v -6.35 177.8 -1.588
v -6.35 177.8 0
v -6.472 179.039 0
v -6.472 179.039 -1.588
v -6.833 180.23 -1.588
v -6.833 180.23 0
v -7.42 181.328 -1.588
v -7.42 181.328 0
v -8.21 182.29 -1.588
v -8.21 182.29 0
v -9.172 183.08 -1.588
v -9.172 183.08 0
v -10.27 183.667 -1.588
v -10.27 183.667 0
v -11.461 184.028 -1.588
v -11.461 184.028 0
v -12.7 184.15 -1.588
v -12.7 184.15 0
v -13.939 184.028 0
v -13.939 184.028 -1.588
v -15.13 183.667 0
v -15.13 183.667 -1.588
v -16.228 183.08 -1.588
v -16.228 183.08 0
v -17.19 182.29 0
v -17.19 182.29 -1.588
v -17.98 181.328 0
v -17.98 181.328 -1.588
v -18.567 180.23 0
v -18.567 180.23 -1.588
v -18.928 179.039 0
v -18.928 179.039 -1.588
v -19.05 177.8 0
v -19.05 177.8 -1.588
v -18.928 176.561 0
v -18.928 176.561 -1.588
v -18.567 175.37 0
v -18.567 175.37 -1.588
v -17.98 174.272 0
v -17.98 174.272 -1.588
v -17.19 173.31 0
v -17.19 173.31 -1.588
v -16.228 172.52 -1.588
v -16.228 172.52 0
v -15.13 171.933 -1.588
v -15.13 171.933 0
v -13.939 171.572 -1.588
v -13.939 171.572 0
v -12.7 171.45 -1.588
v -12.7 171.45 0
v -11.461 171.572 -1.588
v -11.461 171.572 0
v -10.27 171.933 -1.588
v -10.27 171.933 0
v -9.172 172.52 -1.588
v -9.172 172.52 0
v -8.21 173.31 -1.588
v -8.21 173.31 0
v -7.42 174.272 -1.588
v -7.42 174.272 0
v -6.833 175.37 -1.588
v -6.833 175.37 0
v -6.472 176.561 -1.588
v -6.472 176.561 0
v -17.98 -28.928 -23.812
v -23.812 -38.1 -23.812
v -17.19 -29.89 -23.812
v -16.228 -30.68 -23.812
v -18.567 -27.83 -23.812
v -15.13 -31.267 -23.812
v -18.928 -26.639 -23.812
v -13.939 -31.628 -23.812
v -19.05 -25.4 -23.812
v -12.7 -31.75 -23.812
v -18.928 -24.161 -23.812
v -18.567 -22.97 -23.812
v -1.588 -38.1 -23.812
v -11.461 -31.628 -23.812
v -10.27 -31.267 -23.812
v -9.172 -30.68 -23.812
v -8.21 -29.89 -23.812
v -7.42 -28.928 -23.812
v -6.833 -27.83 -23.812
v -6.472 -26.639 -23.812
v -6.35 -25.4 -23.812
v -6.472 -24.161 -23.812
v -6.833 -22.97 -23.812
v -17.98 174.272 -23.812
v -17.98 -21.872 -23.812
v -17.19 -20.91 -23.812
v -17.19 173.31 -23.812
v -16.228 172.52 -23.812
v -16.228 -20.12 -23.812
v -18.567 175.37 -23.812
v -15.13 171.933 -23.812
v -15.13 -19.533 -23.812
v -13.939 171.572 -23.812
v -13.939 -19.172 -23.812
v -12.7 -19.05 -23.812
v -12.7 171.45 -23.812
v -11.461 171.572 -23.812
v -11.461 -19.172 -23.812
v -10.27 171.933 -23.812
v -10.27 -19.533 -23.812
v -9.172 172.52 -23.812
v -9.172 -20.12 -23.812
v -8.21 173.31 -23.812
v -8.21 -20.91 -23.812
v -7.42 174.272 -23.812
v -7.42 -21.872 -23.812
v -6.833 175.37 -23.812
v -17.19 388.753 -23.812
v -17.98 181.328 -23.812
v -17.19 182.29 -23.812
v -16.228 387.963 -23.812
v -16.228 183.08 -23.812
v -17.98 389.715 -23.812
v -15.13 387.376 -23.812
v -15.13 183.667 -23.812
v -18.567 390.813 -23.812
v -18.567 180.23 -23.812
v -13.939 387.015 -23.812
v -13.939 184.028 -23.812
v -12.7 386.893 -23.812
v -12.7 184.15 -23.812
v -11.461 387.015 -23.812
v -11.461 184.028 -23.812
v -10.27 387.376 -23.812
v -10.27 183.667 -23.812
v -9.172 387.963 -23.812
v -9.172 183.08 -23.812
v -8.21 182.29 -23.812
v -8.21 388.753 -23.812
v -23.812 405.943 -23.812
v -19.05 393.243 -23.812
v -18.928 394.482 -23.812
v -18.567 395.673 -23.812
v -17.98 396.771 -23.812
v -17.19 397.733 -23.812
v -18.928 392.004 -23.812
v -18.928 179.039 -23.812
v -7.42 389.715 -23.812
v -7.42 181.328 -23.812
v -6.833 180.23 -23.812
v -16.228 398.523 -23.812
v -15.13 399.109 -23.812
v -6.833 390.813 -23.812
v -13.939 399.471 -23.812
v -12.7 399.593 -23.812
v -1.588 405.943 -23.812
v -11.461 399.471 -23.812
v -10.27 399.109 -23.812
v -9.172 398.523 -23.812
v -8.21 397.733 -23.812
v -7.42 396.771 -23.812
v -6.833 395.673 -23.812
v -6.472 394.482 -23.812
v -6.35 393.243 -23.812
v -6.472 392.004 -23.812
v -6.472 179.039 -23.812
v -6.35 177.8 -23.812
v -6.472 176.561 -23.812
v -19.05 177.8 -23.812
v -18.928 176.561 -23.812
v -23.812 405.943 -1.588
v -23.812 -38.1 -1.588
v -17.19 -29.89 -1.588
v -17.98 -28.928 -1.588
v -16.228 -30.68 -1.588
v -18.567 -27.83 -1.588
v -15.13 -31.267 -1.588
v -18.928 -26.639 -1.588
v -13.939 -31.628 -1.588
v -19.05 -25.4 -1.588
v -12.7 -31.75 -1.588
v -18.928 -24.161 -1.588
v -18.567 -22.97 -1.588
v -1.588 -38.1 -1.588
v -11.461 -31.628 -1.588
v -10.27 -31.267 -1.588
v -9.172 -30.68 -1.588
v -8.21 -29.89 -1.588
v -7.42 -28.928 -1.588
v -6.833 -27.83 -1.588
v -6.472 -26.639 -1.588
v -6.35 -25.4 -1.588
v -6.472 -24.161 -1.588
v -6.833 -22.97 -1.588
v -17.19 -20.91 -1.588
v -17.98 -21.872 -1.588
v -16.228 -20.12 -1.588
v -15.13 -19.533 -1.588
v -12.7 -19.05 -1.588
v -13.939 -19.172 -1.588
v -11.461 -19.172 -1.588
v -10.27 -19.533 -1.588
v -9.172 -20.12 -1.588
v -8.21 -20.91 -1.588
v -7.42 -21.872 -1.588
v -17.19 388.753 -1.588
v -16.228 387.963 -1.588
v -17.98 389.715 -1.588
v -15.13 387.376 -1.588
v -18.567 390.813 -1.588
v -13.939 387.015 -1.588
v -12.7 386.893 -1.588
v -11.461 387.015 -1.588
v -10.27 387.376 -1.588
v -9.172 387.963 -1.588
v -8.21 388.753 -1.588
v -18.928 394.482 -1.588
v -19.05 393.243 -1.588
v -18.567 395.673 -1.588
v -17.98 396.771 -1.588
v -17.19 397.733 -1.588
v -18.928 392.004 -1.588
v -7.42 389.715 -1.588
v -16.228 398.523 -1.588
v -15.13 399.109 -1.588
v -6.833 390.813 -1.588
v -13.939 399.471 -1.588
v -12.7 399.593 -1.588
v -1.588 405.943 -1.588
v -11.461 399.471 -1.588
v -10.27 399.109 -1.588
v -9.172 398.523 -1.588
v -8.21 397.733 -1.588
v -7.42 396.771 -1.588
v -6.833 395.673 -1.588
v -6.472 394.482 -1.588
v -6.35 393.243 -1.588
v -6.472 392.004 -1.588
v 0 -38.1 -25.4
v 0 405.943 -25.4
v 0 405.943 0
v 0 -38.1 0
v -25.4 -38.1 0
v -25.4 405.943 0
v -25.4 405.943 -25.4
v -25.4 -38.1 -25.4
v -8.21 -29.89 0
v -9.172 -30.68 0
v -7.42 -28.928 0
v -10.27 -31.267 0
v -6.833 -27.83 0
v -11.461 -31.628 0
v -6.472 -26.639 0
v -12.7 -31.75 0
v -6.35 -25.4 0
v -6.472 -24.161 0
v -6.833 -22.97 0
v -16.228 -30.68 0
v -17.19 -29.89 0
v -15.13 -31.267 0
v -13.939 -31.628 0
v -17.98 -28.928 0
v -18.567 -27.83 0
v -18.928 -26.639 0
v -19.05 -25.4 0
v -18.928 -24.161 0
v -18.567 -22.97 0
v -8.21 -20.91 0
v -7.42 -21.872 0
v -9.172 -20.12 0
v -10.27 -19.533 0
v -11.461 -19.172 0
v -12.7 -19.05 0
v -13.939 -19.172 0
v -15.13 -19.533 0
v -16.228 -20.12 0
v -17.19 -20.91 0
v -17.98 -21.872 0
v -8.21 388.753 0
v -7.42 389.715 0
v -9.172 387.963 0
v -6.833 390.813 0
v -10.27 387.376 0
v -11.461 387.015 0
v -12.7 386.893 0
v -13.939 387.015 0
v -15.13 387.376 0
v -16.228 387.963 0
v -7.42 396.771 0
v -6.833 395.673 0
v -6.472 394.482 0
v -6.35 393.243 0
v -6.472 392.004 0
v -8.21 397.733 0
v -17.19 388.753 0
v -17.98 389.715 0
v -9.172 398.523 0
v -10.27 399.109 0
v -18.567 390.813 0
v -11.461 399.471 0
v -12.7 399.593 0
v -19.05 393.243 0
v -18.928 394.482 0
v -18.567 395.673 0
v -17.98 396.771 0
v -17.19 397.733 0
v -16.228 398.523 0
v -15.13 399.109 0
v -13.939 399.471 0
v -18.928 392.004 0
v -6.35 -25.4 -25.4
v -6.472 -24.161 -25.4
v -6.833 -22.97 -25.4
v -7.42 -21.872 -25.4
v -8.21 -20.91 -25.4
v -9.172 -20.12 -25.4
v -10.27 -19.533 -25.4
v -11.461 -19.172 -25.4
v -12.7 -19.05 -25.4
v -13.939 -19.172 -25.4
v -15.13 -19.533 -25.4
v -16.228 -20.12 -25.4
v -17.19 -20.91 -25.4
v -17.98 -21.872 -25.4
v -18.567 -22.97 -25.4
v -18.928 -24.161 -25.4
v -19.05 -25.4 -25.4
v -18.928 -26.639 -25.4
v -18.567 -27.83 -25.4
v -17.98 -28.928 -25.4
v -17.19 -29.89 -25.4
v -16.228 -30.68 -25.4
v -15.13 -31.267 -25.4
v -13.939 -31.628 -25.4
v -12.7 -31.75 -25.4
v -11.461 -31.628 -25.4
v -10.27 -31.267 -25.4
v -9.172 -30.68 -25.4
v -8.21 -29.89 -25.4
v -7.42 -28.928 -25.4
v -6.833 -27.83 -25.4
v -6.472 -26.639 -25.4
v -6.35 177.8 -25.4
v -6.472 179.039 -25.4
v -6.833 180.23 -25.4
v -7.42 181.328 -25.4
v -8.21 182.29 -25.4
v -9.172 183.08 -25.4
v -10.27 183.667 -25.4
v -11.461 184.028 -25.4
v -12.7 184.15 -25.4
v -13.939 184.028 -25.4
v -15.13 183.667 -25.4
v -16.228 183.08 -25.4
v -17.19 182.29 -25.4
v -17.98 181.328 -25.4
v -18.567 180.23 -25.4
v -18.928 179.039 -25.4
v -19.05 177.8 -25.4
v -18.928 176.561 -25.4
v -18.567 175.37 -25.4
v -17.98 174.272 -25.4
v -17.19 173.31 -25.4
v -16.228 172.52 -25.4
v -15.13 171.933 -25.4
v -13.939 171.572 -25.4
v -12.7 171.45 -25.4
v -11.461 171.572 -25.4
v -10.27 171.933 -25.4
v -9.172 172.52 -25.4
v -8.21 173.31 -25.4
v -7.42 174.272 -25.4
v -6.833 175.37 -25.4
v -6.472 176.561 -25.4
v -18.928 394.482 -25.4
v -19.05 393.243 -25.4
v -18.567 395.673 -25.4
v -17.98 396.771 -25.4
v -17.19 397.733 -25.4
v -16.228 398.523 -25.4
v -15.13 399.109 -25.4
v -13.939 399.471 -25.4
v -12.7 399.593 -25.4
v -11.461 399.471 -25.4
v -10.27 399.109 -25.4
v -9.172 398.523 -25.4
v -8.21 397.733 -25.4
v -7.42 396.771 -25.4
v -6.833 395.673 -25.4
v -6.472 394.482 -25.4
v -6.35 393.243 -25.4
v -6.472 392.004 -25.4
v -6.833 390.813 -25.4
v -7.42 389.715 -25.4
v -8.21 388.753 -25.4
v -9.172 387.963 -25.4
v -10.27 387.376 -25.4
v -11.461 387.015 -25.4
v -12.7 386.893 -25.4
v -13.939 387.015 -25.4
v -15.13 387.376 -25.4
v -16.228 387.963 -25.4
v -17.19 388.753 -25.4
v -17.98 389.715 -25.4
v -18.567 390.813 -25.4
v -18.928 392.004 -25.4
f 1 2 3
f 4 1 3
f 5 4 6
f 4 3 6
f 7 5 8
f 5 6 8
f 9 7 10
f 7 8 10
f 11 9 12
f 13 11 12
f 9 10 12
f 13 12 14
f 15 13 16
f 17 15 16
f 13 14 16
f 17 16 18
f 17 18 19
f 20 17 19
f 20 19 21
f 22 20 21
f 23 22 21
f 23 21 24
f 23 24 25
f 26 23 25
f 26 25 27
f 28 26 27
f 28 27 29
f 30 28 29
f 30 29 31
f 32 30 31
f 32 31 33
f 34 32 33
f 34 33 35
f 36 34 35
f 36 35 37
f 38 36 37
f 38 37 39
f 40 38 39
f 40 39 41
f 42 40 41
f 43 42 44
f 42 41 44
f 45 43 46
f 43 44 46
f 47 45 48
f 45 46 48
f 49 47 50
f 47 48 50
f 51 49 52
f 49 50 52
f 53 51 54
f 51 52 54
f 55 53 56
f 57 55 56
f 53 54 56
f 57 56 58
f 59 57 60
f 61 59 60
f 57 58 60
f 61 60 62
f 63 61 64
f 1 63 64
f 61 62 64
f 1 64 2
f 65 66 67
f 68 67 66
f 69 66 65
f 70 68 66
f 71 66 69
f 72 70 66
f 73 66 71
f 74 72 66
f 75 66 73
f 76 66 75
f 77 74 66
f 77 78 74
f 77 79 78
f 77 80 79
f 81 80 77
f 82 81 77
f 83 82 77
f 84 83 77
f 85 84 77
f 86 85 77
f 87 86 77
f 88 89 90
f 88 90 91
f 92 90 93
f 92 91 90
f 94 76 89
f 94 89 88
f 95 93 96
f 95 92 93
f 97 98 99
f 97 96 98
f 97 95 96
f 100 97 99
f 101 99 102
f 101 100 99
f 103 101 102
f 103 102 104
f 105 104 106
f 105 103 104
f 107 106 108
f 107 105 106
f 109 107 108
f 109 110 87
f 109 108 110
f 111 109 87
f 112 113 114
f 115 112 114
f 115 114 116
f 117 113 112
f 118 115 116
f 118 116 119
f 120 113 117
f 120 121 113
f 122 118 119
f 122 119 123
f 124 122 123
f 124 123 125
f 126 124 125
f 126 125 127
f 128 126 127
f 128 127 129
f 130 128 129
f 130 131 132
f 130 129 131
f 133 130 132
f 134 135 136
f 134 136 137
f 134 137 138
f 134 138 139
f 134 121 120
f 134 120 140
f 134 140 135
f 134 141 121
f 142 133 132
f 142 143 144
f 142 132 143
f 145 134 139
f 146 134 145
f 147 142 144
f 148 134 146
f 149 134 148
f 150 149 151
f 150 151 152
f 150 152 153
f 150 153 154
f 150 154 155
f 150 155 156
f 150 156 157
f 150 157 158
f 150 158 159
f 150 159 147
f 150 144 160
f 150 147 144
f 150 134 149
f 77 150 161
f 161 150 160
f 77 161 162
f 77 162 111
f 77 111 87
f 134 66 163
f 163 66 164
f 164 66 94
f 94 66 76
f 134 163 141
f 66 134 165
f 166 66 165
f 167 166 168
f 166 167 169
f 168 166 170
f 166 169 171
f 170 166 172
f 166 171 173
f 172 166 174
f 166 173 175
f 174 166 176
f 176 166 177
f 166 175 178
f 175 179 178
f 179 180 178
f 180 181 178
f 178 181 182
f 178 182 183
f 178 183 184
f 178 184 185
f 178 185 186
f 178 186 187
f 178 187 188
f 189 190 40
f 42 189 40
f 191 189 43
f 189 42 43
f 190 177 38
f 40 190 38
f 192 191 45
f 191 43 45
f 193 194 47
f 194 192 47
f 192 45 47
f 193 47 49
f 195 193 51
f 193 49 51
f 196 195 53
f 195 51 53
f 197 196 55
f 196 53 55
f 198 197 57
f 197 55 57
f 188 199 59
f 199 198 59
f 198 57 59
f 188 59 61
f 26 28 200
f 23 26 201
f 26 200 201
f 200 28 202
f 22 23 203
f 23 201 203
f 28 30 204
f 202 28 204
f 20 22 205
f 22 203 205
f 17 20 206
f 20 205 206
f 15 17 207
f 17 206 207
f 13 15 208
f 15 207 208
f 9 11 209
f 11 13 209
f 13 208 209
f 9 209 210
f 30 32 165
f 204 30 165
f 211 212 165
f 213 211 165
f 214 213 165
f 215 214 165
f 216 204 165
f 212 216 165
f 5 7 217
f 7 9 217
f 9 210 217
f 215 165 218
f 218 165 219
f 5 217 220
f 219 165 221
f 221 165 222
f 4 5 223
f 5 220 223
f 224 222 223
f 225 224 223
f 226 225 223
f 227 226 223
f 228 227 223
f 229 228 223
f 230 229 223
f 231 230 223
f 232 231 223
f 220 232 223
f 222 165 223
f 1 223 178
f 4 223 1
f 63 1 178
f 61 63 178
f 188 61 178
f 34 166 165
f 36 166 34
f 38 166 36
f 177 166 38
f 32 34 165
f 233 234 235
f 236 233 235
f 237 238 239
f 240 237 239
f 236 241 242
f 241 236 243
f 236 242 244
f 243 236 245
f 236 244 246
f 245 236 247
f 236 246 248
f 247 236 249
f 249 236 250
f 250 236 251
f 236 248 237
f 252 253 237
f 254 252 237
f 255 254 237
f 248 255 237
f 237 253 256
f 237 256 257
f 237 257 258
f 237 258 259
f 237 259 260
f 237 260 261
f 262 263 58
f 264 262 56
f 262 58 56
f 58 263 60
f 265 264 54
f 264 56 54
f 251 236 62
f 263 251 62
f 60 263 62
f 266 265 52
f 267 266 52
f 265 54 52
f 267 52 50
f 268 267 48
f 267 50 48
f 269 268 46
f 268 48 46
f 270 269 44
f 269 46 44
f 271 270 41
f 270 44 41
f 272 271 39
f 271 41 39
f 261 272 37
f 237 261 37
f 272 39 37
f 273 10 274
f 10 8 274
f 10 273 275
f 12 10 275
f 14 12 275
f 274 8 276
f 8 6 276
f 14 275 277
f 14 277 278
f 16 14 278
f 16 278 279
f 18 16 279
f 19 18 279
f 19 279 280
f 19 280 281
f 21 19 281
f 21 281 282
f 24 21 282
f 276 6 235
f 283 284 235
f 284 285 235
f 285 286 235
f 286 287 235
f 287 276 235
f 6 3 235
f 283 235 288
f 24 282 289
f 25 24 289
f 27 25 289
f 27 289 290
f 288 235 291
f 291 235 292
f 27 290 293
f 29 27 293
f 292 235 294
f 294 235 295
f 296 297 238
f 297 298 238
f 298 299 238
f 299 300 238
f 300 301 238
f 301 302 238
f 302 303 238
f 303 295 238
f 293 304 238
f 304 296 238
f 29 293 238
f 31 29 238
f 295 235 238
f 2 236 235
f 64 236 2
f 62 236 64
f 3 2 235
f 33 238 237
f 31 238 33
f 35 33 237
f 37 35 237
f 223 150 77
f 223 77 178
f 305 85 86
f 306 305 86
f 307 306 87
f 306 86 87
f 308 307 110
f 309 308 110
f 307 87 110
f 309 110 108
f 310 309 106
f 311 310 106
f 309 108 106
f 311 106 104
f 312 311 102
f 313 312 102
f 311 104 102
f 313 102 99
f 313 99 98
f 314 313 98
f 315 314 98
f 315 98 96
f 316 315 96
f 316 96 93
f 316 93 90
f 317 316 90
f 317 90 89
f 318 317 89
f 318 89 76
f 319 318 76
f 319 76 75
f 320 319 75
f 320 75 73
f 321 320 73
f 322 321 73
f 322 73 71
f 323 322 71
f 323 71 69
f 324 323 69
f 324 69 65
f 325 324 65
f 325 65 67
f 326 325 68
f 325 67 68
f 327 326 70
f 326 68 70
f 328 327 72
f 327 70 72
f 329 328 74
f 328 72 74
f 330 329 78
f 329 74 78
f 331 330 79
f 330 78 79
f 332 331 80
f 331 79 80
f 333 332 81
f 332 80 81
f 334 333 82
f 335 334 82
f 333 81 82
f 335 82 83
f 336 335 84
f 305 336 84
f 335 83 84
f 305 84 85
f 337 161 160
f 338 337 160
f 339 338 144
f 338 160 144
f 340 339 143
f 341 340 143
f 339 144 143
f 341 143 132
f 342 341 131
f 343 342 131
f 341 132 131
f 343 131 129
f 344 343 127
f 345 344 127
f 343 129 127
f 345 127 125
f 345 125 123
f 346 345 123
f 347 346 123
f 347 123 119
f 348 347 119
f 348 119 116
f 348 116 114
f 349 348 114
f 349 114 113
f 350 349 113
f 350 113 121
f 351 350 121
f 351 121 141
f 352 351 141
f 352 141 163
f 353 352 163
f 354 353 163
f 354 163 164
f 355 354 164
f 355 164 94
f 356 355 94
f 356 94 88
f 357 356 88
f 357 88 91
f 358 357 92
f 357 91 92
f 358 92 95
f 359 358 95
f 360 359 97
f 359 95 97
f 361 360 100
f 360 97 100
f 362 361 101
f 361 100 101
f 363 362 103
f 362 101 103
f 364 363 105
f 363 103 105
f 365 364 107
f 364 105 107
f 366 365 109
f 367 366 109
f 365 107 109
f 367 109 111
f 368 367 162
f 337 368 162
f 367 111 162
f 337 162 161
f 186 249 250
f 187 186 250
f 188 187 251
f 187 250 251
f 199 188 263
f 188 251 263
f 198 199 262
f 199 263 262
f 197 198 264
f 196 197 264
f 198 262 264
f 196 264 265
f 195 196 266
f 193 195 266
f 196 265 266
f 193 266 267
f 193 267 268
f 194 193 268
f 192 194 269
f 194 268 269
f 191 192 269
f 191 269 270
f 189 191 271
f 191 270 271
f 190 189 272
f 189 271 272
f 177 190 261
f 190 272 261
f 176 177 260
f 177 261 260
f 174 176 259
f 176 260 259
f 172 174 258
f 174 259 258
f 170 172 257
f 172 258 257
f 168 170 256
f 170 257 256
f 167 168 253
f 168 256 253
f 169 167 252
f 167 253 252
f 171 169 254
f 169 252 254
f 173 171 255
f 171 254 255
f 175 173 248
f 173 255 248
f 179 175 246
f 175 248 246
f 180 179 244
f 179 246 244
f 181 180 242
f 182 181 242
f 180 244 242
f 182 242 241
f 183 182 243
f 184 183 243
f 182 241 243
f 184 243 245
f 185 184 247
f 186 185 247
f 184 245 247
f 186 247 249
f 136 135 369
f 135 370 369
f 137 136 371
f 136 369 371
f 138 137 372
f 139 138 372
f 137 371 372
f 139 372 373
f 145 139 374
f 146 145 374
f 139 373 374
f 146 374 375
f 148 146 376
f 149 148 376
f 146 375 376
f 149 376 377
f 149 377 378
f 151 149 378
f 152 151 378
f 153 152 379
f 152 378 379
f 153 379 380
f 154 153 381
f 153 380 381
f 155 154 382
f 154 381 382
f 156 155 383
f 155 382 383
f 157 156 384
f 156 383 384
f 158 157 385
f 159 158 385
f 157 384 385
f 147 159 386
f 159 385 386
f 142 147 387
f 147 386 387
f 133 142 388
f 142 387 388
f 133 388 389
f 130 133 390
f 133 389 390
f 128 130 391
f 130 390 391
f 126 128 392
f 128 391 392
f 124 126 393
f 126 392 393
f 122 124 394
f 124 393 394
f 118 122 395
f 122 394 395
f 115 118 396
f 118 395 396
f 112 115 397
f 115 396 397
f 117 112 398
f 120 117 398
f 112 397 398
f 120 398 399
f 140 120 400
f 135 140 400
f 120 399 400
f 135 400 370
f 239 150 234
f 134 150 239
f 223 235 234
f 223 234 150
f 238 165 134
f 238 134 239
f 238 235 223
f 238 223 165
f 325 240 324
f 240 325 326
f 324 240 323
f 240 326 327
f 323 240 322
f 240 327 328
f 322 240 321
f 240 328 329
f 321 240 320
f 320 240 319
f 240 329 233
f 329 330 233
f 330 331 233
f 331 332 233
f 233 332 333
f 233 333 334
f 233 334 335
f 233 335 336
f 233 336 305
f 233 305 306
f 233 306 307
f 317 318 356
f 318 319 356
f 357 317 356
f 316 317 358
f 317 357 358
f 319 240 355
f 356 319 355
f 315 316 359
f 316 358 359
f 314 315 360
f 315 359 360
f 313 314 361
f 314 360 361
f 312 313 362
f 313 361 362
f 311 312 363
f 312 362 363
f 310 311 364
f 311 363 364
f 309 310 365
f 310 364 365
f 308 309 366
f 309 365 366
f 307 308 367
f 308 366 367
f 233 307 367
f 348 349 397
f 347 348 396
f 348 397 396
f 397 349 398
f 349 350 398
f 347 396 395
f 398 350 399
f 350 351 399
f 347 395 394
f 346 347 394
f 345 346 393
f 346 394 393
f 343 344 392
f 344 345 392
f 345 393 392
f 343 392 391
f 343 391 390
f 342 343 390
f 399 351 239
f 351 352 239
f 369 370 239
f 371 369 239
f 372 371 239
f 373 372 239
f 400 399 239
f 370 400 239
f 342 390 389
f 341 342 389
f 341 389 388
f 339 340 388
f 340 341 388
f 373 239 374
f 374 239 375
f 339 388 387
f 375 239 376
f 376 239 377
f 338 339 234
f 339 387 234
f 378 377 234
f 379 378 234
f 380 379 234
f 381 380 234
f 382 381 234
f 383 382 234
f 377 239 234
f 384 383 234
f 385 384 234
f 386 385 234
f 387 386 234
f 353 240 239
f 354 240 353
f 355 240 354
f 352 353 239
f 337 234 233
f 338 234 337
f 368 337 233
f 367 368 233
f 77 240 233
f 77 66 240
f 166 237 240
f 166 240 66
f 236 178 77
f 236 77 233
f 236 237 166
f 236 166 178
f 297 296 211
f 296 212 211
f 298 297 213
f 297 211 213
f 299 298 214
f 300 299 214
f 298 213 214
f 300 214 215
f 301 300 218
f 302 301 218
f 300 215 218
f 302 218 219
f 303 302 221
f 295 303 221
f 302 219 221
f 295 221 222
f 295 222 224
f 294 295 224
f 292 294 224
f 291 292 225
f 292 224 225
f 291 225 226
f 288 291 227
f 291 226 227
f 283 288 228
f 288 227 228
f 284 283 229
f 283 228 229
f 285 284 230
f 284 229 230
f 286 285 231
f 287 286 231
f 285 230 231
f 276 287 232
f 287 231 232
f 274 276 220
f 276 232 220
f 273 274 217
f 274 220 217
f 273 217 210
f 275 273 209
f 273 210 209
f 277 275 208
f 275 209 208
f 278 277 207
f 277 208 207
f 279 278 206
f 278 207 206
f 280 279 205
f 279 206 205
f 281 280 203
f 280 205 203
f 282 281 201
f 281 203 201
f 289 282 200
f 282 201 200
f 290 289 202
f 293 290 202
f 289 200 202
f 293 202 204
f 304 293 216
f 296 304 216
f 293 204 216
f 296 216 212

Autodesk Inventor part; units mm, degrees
ref_plane "YZ Plane" through (0, 0, 0) normal (1, 0, 0) x (0, 1, 0)
ref_plane "XZ Plane" through (0, 0, 0) normal (0, 1, 0) x (-1, 0, 0)
ref_plane "XY Plane" through (0, 0, 0) normal (0, 0, 1) x (1, 0, 0)
sketch "Sketch1" plane through (0, 0, 0) normal (0, 1, 0) x (-1, 0, 0)
  line L0 (0, 0) -> (25.4, 0)
  line L1 (25.4, 0) -> (25.4, -25.4)
  line L2 (25.4, -25.4) -> (0, -25.4)
  line L3 (0, -25.4) -> (0, 0)
  line L4 (23.8125, -23.8125) -> (23.8125, -1.5875)
  line L5 (23.8125, -1.5875) -> (1.5875, -1.5875)
  line L6 (1.5875, -1.5875) -> (1.5875, -23.8125)
  line L7 (1.5875, -23.8125) -> (23.8125, -23.8125)
  dimension "d0" = 25.4
  dimension "d1" = 25.4
  dimension "d2" = 1.5875
extrude "Extrusion1" add sketch "Sketch1" along normal blind 405.9428
sketch "Sketch4" plane through (-25.4, 0, 0) normal (0, 0, 1) x (1, 0, 0)
  circle A0 centre (12.7, 177.8) radius 6.35
  line L0 (0, 0) -> (0, 405.9428) projected
  line L1 (25.4, 0) -> (0, 0) projected
  dimension "d13" = 12.7
  dimension "d14" = 12.7
  dimension "d15" = 177.8
extrude "Extrusion4" cut sketch "Sketch4" against normal blind 25.4
sketch "Sketch5" plane through (0, 0, 0) normal (0, -1, 0) x (1, 0, 0)
  line L0 (-25.4, -25.4) -> (0, -25.4) projected
  line L1 (0, 0) -> (-25.4, 0) projected
  line L2 (-25.4, -25.4) -> (0, -25.4)
  line L3 (0, -25.4) -> (0, 0)
  line L4 (0, 0) -> (-25.4, 0)
  line L5 (-25.4, 0) -> (-25.4, -25.4)
  line L6 (-23.8125, -1.5875) -> (-1.5875, -1.5875) projected
  line L7 (-23.8125, -23.8125) -> (-23.8125, -1.5875) projected
  line L8 (-1.5875, -1.5875) -> (-23.8125, -1.5875)
  line L9 (-23.8125, -1.5875) -> (-23.8125, -23.8125)
  line L10 (-23.8125, -23.8125) -> (-1.5875, -23.8125)
  line L11 (-1.5875, -23.8125) -> (-1.5875, -1.5875)
extrude "Extrusion5" add sketch "Sketch5" along normal blind 38.1
sketch "Sketch6" plane through (-25.4, 405.9428, 0) normal (0, 0, 1) x (1, 0, 0)
  circle A0 centre (12.7, -431.3428) radius 6.35
  line L0 (25.4, -444.0428) -> (0, -444.0428) projected
  line L1 (0, 0) -> (0, -444.0428) projected
  point P0 (25.4, -405.9428)
  dimension "d21" = 12.7
  dimension "d22" = 12.7
  dimension "d23" = 12.7
extrude "Extrusion6" cut sketch "Sketch6" against normal blind 38.1
sketch "Sketch7" plane through (0, 405.9428, -25.4) normal (0, 0, -1) x (-1, 0, 0)
  circle A0 centre (12.7, -12.7) radius 6.35
  line L0 (0, 0) -> (0, -444.0428) projected
  line L1 (25.4, -444.0428) -> (0, -444.0428) projected
  line L2 (0, 0) -> (25.4, 0) projected
  point P0 (0, -405.9428)
  dimension "d26" = 12.7
  dimension "d31" = 12.7
  dimension "d32" = 12.7
extrude "Extrusion7" cut sketch "Sketch7" against normal blind 25.4
properties part number "AP 4"
